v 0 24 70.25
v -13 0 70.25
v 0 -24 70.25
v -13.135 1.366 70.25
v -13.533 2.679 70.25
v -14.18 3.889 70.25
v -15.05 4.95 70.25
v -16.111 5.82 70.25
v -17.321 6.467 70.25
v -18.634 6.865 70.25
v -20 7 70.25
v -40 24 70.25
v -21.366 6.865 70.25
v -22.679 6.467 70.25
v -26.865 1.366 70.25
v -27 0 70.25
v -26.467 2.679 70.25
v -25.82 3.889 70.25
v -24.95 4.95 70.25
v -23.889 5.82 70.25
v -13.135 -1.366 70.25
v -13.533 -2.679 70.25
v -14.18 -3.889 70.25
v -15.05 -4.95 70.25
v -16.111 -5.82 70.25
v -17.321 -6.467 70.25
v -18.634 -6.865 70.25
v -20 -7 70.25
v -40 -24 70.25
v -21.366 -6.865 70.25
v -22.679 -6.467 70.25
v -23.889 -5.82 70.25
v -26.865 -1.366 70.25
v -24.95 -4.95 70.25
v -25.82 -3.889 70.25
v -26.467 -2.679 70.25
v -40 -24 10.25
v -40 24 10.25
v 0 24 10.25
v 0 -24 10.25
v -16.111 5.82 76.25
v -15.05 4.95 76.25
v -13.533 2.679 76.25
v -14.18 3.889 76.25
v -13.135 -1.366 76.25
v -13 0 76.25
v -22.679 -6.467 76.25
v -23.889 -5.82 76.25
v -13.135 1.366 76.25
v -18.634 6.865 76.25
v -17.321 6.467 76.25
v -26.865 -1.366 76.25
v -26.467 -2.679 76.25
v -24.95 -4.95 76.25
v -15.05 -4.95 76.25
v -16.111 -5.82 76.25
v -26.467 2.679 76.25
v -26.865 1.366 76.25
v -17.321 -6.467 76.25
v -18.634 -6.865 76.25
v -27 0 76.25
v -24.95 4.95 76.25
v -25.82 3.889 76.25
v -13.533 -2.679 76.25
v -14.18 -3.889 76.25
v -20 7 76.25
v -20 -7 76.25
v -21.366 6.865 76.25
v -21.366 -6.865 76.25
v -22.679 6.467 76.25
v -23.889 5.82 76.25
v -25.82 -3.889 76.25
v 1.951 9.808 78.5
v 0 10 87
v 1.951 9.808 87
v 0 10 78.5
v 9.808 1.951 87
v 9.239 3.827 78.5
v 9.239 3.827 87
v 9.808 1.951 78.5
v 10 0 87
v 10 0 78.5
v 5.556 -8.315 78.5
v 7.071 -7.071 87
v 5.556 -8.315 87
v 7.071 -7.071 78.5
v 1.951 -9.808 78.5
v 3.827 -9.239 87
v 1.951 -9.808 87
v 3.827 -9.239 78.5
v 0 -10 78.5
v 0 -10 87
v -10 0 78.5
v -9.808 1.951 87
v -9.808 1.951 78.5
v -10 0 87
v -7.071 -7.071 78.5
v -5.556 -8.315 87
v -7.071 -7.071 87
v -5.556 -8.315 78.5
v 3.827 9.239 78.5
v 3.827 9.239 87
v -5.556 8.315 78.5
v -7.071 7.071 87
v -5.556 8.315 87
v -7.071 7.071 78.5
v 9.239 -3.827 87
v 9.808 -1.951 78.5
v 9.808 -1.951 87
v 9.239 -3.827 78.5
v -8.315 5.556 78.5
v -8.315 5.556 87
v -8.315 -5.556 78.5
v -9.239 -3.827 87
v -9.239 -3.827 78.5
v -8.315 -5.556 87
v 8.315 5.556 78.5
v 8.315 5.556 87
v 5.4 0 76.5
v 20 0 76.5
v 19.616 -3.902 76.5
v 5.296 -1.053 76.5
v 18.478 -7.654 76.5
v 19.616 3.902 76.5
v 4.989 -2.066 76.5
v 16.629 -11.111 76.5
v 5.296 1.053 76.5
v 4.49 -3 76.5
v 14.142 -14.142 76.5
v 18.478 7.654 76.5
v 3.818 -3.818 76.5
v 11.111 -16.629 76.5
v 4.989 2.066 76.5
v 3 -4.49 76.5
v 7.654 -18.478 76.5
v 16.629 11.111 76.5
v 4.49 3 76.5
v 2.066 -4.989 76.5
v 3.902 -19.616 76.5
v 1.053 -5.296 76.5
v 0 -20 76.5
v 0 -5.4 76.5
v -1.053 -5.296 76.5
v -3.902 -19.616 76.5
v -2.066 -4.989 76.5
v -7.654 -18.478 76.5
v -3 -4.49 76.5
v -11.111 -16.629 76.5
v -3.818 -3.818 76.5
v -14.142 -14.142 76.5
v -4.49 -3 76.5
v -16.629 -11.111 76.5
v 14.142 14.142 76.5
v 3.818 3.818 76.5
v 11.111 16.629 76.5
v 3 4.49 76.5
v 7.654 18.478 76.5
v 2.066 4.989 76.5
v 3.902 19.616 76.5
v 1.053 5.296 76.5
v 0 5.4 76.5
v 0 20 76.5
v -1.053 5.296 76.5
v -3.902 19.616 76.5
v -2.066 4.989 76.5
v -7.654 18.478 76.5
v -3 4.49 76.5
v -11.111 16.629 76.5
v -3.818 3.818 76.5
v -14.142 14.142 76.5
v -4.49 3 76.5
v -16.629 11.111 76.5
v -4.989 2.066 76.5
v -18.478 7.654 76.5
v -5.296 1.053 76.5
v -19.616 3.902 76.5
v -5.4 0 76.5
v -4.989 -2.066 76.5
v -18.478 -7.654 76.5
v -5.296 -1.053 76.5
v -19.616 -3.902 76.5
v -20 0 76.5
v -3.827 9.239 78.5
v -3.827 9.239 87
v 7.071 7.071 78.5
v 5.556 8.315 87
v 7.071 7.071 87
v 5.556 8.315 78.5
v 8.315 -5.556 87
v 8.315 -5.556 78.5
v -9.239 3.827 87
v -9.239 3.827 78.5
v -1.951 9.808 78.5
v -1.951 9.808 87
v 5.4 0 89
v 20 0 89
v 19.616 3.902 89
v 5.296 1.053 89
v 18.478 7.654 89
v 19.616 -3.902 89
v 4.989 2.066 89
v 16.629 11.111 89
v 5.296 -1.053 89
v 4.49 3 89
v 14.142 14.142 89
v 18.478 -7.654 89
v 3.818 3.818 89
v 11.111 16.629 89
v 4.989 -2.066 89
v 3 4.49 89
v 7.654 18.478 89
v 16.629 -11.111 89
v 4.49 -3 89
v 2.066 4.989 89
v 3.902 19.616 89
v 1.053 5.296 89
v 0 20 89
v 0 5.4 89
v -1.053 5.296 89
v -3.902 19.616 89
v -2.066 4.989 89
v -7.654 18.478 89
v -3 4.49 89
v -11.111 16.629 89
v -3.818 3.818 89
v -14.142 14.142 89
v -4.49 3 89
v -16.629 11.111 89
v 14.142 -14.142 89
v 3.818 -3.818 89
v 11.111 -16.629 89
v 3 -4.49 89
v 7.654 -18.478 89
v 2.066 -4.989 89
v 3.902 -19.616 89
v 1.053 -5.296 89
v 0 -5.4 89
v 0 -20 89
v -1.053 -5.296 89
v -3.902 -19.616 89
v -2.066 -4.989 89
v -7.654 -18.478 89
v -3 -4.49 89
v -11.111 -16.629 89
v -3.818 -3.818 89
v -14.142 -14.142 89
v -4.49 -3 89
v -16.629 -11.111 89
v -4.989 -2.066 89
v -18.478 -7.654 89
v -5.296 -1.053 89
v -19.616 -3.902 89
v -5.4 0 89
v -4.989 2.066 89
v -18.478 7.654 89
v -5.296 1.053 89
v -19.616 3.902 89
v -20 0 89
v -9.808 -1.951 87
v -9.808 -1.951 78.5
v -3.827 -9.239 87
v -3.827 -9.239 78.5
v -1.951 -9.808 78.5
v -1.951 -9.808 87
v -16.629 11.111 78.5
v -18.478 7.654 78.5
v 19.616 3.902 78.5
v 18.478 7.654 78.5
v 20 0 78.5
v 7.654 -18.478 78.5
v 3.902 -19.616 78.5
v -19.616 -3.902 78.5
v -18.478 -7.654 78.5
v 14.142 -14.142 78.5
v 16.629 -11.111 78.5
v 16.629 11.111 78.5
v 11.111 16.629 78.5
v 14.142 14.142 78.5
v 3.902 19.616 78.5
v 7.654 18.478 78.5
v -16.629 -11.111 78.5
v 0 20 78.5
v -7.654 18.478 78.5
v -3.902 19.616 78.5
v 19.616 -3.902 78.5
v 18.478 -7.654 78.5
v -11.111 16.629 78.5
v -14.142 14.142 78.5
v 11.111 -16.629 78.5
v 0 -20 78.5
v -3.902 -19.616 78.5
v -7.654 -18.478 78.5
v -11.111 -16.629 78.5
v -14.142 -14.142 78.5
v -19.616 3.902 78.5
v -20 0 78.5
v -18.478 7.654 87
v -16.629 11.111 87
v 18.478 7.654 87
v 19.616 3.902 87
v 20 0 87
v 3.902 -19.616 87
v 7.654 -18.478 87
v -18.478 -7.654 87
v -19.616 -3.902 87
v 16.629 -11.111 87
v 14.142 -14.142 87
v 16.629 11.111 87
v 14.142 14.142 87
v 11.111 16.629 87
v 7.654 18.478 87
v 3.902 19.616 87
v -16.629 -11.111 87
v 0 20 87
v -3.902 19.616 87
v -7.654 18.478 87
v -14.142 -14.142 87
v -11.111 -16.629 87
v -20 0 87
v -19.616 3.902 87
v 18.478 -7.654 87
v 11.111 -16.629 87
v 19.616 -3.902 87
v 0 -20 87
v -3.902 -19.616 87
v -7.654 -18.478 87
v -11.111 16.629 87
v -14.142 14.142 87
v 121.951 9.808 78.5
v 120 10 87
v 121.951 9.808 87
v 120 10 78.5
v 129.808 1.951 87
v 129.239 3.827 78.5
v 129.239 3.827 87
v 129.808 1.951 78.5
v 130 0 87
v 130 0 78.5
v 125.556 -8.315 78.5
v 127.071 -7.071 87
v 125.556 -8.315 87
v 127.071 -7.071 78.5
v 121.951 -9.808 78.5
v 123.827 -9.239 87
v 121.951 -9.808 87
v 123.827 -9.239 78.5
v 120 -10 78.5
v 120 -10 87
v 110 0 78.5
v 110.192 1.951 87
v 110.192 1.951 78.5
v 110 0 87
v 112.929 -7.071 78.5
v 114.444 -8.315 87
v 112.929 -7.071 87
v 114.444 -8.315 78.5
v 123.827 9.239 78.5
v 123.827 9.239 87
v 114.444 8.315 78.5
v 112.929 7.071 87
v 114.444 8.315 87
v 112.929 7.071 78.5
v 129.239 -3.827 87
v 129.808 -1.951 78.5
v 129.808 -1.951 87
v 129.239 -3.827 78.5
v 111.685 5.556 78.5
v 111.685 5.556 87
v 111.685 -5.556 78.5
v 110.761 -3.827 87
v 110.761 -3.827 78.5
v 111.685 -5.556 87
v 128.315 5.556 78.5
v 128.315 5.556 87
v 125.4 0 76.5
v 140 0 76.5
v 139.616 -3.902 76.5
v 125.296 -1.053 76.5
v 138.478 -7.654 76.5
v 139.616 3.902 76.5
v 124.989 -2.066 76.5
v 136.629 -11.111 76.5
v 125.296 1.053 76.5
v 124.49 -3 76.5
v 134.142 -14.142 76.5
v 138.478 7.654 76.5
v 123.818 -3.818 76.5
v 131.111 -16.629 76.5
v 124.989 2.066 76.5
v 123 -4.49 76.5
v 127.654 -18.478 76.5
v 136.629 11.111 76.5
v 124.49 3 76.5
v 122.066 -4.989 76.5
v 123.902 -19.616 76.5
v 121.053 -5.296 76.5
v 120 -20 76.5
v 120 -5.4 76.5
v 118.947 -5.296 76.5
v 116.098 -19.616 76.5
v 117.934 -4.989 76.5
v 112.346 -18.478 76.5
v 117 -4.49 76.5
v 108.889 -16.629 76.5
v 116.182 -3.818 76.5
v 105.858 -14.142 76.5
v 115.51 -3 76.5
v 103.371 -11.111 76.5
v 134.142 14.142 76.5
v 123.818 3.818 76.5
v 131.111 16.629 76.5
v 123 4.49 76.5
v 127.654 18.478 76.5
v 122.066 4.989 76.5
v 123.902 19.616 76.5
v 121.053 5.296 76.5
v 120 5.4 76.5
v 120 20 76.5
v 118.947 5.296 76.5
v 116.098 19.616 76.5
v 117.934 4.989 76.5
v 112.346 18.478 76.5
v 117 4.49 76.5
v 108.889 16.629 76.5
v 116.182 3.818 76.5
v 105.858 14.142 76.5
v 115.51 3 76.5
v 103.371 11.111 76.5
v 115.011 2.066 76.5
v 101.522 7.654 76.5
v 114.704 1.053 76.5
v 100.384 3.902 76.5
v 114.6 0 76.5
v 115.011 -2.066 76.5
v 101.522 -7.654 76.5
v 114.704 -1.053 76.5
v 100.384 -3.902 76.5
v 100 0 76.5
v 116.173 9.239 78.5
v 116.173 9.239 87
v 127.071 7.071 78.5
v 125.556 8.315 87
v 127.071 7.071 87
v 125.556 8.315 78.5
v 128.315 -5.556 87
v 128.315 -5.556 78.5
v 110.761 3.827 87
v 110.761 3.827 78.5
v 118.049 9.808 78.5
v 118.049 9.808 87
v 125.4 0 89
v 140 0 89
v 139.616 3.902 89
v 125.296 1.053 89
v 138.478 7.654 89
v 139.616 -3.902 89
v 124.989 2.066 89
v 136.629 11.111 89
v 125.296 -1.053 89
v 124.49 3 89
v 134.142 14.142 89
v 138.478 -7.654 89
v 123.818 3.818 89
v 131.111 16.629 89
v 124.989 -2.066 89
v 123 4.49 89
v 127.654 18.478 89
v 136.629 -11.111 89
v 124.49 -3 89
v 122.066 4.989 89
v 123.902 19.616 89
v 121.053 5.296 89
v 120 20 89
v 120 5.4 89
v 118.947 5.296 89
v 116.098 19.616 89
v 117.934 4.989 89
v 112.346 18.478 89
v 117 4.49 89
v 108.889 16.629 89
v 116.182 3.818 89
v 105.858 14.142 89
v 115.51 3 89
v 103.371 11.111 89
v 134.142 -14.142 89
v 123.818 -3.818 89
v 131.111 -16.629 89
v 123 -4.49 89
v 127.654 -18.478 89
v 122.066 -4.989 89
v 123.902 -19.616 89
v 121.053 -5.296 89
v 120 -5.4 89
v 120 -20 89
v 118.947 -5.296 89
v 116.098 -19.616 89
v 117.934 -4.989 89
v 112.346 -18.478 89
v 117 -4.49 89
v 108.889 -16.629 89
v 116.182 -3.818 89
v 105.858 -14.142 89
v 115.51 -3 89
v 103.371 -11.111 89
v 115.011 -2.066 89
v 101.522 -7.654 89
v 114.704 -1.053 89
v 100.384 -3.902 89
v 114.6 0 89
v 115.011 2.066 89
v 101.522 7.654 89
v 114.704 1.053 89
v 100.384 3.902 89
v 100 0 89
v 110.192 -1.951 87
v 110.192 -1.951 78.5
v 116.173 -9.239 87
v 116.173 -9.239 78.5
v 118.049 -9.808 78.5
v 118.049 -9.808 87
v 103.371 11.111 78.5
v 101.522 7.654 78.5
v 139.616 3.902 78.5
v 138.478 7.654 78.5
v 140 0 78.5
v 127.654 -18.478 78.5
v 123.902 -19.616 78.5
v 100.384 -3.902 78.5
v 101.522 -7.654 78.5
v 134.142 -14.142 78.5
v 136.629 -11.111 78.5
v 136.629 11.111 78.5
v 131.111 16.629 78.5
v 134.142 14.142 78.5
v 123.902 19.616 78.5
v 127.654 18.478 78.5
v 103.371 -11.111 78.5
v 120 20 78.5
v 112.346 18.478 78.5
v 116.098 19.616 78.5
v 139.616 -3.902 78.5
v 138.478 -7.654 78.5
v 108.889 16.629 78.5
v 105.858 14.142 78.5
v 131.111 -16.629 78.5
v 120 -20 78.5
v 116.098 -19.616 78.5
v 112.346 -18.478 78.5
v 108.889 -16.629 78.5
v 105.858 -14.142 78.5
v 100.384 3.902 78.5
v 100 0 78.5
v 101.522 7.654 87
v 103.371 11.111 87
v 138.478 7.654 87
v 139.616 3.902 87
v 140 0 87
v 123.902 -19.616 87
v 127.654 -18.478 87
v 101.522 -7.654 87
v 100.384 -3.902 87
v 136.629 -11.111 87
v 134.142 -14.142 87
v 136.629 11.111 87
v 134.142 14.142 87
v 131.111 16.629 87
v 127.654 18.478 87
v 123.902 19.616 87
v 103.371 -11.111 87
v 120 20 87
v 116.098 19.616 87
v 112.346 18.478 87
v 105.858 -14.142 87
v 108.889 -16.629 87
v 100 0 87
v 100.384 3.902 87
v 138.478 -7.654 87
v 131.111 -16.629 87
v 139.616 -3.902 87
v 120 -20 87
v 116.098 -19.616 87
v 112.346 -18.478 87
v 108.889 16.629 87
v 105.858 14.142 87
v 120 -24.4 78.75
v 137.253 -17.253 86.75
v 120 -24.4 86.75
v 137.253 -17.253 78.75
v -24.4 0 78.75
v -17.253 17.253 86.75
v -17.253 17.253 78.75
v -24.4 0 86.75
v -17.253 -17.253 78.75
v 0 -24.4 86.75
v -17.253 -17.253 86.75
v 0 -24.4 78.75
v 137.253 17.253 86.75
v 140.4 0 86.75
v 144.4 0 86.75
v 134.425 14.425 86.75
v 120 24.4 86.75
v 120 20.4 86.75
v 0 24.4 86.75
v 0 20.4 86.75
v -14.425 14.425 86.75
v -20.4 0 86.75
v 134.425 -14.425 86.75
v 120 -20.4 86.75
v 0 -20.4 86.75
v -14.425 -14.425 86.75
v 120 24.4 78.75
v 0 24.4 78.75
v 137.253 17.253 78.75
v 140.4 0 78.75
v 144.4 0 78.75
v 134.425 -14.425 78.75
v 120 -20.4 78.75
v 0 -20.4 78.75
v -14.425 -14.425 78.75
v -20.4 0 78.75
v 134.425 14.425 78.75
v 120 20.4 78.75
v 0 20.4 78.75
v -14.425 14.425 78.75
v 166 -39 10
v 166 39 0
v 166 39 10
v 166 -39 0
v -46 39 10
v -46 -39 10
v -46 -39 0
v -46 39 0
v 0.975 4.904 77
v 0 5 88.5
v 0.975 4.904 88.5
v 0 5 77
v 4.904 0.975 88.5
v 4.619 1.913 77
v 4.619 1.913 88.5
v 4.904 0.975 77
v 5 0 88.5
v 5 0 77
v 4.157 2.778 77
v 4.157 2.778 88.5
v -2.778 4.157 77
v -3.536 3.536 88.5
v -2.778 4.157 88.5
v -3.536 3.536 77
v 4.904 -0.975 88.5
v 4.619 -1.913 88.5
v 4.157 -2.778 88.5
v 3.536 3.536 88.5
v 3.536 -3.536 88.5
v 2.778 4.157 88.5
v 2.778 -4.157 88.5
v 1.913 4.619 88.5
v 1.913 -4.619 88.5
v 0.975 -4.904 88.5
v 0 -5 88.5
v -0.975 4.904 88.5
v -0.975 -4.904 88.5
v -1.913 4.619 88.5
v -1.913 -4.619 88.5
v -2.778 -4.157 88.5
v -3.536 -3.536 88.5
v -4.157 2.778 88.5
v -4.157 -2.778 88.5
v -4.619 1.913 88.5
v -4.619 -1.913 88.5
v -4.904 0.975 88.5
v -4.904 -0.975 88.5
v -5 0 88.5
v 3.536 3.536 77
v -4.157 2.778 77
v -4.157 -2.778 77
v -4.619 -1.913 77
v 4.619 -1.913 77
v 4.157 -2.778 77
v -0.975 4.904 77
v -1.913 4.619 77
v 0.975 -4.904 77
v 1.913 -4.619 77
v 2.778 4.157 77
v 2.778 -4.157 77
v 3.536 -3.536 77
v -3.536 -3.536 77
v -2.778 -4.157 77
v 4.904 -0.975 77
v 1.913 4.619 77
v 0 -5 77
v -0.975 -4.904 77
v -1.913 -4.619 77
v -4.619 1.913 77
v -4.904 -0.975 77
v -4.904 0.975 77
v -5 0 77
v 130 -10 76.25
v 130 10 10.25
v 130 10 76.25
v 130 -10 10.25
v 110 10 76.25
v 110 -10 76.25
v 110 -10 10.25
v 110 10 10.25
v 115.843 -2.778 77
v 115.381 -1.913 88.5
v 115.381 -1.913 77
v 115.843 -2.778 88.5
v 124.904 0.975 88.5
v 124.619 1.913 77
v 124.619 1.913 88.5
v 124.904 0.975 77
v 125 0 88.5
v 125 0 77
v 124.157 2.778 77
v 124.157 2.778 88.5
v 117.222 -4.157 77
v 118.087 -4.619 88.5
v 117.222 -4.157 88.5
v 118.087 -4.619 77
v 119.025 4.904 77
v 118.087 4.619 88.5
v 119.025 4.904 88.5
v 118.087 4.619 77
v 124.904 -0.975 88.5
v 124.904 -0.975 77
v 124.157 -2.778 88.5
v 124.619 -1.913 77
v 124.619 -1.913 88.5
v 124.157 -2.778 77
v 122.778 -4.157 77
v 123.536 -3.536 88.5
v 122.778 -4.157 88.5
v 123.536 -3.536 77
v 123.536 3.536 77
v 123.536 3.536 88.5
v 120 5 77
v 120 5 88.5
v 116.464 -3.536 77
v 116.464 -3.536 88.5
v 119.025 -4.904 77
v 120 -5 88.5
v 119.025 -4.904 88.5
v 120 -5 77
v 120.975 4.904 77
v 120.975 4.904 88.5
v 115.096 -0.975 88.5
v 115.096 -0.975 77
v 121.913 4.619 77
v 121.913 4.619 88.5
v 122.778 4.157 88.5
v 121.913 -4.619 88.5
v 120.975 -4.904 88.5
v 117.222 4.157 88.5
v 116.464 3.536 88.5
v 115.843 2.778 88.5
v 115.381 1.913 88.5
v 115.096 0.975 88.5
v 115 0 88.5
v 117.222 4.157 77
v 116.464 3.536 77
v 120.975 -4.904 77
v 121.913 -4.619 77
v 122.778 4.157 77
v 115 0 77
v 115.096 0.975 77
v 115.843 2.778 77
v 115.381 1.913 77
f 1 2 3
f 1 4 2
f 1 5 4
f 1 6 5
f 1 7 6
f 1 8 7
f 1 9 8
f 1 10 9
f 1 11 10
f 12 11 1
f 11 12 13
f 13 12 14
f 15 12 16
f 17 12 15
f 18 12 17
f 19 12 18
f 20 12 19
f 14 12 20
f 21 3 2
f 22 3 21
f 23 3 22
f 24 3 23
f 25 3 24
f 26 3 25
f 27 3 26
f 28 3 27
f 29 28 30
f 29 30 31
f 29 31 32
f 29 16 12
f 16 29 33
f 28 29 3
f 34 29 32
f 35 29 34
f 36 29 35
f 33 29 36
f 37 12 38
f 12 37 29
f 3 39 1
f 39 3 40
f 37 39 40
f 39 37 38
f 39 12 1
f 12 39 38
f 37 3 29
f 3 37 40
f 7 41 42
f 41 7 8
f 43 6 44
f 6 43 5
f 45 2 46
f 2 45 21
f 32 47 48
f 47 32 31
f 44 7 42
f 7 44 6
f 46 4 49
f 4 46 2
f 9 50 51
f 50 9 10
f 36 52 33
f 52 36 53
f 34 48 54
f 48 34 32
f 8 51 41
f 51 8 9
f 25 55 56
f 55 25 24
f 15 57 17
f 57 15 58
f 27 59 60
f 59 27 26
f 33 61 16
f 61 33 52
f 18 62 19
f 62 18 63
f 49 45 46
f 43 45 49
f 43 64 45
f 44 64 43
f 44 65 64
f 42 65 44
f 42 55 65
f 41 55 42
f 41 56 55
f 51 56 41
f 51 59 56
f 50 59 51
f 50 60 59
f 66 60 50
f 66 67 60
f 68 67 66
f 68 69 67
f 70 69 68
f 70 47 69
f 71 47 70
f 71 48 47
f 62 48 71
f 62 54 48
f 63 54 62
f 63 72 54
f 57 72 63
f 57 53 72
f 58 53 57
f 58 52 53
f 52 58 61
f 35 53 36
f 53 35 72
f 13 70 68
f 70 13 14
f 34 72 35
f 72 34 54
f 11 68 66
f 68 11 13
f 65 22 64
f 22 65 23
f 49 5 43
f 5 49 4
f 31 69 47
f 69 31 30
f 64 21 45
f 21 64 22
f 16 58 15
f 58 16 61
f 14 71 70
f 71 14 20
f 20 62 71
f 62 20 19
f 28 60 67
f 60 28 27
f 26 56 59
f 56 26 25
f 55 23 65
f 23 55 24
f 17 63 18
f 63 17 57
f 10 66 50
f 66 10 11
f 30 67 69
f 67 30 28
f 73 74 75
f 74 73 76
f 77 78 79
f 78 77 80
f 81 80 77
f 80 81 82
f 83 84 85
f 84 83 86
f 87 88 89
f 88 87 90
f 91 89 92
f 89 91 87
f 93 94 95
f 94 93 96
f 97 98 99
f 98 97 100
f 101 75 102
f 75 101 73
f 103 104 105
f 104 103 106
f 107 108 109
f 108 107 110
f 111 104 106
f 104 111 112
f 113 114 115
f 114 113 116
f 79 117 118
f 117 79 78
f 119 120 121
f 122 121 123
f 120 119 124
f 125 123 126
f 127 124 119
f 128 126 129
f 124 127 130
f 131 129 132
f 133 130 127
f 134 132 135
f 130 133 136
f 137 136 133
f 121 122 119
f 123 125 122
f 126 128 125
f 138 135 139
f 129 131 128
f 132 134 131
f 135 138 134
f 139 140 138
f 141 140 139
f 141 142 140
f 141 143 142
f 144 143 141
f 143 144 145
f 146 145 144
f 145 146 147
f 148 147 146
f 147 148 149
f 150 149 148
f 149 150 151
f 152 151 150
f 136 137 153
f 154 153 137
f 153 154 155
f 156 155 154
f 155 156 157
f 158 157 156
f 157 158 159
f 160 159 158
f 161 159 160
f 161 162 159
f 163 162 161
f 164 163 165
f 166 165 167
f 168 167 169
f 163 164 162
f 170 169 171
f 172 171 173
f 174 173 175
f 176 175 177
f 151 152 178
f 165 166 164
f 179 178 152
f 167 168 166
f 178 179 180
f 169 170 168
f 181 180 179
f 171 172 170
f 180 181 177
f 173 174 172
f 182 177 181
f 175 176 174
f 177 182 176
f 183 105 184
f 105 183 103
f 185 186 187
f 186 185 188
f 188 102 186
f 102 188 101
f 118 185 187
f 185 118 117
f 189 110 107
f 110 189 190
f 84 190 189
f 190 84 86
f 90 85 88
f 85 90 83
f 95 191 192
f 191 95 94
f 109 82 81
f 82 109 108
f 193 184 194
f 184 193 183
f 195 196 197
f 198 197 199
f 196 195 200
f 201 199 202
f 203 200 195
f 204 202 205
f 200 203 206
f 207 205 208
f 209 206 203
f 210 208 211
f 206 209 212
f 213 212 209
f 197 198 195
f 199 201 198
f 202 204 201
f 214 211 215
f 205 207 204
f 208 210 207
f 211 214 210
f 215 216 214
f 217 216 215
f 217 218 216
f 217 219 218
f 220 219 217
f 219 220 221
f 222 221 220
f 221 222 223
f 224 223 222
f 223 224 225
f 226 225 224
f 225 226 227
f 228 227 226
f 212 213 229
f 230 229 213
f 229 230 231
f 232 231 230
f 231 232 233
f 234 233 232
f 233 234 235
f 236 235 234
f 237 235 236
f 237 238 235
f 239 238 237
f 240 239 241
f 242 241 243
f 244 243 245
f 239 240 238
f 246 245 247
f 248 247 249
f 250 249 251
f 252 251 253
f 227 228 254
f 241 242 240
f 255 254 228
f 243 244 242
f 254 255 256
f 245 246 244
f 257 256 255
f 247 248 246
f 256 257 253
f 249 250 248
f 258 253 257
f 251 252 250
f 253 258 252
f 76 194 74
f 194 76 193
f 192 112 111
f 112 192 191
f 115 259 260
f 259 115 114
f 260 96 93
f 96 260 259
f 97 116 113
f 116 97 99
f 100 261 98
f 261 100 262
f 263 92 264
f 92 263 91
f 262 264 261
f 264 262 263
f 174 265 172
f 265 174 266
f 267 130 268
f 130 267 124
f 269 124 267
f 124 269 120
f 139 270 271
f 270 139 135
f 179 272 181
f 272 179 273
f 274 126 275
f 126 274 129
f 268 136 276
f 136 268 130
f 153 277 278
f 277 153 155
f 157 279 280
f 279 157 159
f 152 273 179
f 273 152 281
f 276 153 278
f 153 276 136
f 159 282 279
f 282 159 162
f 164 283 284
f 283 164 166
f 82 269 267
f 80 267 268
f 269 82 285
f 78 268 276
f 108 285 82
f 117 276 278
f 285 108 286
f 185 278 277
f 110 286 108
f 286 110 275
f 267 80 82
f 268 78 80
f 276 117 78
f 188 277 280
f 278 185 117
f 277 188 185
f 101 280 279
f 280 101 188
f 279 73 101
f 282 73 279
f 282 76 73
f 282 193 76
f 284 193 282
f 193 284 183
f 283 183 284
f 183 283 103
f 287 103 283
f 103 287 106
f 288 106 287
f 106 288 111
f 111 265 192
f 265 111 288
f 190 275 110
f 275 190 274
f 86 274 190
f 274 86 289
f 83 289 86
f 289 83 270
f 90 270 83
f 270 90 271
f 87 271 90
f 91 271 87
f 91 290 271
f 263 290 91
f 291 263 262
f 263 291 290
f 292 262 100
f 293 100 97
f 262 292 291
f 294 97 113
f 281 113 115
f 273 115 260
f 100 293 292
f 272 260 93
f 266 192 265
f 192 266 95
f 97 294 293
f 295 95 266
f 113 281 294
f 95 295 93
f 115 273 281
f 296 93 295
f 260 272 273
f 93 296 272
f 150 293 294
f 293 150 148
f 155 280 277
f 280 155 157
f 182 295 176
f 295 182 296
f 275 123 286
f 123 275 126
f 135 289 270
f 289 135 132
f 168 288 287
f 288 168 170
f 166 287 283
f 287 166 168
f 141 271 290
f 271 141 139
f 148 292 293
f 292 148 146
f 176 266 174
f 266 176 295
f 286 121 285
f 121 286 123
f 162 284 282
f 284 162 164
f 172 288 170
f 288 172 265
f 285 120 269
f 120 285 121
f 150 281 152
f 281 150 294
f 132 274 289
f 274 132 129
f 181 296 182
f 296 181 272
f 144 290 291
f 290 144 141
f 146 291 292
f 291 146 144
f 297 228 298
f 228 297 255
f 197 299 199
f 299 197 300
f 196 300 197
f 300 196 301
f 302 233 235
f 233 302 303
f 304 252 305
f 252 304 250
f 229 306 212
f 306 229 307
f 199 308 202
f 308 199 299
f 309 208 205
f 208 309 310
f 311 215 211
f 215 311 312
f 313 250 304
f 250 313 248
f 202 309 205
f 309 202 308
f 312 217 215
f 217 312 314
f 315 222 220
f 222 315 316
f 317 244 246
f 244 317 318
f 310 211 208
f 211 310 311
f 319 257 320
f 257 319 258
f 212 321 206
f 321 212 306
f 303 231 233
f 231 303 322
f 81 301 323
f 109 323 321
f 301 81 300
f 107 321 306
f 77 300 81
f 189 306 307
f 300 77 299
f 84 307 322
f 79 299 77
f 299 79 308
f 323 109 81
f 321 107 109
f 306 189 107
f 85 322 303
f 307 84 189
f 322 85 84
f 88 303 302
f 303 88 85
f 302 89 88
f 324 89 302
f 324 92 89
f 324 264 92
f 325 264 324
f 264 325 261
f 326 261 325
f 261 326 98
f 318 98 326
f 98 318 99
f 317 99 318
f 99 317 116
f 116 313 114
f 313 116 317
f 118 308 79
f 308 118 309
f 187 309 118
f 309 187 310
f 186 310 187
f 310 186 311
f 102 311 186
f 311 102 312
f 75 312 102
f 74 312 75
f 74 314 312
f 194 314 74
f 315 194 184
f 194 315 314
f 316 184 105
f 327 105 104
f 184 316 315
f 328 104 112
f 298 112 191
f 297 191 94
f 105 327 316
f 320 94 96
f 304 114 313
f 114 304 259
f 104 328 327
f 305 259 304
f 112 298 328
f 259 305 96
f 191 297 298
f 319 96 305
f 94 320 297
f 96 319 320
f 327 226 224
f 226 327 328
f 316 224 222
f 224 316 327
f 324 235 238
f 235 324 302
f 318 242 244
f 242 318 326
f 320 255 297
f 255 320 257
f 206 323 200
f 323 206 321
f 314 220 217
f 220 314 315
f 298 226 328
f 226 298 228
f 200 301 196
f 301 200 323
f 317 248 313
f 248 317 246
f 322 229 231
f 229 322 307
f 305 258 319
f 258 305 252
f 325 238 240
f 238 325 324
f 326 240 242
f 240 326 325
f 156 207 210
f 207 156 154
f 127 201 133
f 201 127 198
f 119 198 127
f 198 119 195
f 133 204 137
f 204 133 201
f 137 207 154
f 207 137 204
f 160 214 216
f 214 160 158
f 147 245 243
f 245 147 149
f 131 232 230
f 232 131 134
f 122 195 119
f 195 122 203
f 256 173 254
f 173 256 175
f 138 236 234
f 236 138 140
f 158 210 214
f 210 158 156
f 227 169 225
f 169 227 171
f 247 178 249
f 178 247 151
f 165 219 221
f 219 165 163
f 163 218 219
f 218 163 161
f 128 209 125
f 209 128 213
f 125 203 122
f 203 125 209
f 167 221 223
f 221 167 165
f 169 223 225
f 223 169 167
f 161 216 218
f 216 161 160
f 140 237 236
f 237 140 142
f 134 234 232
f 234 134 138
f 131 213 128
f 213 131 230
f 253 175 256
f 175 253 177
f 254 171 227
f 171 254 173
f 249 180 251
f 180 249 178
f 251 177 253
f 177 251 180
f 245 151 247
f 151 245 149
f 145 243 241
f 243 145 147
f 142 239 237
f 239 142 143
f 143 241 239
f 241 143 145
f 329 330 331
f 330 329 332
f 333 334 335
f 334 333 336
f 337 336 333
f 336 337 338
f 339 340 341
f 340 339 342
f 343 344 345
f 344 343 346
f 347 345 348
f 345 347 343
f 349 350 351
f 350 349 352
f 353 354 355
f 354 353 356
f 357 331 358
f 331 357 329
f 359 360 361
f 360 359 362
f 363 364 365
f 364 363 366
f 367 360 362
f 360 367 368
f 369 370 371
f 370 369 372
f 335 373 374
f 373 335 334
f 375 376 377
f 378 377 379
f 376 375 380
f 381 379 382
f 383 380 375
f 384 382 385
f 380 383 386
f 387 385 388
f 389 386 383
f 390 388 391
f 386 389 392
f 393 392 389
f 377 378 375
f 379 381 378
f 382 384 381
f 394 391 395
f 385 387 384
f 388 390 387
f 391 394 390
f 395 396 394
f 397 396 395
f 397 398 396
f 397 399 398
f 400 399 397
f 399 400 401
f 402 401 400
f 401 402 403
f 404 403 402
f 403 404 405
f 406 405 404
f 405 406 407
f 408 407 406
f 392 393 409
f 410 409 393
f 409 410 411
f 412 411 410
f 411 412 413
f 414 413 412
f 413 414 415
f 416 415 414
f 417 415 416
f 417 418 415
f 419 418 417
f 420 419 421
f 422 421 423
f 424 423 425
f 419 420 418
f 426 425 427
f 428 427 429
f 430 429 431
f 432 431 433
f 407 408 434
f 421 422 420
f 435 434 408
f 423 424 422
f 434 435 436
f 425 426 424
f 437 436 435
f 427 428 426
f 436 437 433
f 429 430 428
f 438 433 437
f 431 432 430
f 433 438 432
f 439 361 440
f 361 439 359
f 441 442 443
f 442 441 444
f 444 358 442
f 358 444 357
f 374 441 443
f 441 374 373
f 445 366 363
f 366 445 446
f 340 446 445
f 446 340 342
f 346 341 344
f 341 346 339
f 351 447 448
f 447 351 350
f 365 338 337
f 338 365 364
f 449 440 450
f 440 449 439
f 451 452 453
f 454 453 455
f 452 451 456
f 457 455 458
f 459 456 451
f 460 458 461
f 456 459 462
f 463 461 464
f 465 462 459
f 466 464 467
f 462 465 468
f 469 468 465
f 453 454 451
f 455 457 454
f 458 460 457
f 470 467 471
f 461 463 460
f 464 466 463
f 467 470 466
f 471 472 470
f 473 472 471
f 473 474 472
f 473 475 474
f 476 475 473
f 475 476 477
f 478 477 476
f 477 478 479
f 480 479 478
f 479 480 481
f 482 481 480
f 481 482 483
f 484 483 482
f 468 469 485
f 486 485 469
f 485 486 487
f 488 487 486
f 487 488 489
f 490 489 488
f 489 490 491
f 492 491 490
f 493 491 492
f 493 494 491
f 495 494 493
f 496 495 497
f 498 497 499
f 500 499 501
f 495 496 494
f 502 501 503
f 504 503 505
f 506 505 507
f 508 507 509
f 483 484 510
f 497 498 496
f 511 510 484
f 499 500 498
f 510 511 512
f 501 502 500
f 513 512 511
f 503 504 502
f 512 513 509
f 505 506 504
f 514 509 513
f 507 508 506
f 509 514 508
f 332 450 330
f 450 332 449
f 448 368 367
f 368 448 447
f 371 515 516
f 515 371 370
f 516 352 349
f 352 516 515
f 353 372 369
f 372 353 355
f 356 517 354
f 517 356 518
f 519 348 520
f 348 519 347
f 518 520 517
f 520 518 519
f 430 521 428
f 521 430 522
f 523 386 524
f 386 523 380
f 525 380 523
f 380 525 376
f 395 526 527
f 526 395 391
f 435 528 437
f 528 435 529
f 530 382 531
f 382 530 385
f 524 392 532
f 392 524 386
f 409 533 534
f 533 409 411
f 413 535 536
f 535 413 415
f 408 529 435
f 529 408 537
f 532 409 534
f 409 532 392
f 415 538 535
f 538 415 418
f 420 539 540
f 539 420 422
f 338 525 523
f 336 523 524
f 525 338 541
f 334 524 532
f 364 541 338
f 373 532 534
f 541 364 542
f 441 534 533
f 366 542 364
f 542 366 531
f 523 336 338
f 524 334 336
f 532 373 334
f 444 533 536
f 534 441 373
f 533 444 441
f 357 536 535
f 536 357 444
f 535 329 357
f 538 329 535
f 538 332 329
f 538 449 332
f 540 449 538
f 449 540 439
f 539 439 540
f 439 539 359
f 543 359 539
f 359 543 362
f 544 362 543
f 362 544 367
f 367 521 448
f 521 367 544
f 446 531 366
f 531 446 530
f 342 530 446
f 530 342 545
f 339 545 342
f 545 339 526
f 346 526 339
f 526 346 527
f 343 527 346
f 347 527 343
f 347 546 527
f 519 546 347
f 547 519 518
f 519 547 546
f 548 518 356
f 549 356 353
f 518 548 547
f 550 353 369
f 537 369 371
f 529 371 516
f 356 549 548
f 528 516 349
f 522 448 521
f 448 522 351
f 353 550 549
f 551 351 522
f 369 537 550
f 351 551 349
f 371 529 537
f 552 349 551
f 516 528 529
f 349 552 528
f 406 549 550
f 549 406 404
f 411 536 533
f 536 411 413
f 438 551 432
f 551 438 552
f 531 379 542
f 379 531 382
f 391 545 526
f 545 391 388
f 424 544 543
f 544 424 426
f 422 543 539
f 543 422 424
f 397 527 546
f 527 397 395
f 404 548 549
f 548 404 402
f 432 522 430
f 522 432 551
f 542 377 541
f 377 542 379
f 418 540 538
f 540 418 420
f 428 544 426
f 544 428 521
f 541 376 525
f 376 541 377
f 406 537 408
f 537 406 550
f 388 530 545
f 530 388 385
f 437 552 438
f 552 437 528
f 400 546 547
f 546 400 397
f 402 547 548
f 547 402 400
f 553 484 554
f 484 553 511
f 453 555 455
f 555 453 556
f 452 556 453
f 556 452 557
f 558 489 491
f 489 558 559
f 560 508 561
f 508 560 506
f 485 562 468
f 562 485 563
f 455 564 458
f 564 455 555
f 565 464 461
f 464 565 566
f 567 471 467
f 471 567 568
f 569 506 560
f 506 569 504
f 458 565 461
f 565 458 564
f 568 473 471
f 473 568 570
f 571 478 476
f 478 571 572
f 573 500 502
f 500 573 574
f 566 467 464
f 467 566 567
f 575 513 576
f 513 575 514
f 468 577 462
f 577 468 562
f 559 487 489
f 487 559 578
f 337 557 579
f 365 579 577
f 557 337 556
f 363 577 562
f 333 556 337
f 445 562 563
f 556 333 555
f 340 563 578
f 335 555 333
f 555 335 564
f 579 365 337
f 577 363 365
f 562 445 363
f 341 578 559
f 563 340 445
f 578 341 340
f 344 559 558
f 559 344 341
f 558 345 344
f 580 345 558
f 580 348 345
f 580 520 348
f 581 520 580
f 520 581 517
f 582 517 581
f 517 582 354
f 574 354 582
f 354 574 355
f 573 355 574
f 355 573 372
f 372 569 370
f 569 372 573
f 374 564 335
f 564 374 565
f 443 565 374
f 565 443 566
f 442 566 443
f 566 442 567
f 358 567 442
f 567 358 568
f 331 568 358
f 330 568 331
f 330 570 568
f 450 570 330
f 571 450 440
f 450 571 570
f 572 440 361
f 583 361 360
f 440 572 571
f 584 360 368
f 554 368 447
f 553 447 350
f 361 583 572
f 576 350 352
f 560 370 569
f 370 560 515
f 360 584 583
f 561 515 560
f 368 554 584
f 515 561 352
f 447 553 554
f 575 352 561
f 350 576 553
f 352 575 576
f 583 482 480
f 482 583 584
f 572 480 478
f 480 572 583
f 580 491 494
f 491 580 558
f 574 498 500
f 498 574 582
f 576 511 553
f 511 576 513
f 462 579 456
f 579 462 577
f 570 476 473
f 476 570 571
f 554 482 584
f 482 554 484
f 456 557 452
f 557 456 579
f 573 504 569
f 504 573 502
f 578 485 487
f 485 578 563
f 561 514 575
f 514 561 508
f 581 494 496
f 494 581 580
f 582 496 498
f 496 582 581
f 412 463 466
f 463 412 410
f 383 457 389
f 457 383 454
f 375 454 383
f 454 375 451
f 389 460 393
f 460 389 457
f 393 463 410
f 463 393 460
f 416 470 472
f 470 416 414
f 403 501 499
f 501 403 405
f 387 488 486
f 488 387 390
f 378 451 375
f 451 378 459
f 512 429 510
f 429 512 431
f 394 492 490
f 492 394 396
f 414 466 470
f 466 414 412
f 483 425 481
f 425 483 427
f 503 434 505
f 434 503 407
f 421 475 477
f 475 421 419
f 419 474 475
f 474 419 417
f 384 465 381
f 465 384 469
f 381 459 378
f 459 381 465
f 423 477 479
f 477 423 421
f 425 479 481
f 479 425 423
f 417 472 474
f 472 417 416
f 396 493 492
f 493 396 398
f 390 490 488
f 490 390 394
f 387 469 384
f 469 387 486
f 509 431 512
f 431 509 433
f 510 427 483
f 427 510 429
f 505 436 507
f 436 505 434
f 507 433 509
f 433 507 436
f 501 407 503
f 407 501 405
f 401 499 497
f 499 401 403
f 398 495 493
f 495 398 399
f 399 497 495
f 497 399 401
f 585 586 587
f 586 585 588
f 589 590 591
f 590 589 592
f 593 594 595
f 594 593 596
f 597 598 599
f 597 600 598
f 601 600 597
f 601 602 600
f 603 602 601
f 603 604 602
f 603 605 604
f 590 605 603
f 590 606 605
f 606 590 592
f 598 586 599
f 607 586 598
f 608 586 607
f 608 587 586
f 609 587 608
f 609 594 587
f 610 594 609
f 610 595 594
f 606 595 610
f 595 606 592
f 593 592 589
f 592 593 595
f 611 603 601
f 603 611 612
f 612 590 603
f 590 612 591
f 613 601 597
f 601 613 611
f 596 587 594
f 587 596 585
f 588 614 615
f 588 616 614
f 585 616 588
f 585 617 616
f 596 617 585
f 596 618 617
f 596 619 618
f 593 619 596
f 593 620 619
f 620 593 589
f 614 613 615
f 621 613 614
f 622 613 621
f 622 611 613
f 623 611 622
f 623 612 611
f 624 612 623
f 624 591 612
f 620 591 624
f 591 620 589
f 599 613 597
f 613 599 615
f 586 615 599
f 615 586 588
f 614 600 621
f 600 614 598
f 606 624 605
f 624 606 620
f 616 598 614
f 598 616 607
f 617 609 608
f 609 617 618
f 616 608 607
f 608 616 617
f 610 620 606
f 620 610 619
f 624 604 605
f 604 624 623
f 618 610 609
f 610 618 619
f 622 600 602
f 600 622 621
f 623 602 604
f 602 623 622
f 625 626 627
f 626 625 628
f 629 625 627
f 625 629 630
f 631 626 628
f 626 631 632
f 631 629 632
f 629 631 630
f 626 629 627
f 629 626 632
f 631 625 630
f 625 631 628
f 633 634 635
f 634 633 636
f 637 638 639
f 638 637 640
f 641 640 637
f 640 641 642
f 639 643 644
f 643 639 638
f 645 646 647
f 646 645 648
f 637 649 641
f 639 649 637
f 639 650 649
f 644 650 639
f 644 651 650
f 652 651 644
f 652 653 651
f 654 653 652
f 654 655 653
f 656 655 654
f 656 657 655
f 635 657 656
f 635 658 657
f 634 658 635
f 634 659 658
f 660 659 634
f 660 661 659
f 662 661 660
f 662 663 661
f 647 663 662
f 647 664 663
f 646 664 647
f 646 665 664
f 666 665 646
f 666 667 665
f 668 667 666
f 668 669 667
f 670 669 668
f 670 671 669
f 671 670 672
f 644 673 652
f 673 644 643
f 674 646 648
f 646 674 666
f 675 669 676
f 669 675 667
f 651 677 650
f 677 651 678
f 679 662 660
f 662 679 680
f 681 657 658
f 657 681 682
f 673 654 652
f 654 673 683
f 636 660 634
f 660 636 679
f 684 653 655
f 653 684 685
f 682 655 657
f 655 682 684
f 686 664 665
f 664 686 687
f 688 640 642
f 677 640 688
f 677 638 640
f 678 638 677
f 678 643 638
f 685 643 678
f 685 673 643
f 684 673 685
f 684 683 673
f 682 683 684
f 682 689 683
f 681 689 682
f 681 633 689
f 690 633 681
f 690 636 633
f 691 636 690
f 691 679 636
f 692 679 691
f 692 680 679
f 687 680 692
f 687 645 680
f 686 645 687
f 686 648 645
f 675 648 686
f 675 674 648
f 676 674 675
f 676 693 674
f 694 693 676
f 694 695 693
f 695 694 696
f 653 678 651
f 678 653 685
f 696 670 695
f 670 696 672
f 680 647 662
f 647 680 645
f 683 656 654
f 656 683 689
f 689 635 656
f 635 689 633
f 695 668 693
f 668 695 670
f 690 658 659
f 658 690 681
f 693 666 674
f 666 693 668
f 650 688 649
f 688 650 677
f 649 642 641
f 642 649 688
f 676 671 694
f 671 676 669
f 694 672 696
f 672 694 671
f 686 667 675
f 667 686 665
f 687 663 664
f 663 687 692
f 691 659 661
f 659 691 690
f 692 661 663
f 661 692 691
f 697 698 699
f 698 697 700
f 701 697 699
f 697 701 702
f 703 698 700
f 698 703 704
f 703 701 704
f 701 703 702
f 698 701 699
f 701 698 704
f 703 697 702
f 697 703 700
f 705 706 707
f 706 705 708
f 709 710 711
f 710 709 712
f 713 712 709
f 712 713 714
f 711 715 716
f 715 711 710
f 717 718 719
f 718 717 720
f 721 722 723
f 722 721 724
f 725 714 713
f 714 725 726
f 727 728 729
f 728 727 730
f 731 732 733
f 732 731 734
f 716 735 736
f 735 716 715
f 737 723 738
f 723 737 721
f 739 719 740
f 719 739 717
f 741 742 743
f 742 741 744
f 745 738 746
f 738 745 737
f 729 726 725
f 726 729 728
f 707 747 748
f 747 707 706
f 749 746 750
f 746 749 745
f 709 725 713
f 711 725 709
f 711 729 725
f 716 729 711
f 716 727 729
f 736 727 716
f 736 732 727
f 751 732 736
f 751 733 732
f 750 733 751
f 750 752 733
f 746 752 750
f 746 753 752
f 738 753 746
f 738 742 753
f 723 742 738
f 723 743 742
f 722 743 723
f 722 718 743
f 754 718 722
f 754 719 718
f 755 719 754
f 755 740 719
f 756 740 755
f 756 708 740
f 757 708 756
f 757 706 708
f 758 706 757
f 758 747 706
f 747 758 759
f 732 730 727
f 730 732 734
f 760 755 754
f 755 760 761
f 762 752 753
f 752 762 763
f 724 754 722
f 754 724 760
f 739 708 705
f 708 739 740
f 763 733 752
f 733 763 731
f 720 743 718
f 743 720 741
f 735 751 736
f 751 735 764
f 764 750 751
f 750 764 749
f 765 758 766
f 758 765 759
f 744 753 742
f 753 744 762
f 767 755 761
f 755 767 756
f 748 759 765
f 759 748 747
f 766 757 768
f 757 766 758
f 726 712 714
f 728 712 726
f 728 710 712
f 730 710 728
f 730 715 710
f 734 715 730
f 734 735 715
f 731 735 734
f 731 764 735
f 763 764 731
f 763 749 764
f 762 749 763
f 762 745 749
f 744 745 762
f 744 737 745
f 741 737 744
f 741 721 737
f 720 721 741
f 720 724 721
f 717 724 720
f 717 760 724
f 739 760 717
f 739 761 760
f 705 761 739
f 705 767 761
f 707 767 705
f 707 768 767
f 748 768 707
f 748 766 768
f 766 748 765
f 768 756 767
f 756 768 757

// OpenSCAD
$fn = 32;

// ------------------------------------------------------------------------
// Motor belt drive: span 120 mm, pulleys d40, belt 8 mm wide
// Every part is its own module, assembly() places every instance.
// ------------------------------------------------------------------------

// --- part 1 ---
module base_plate() {
  difference() {
    translate([-106, -39, 0]) cube([212, 78, 10]);
  }
}

// --- part 2 ---
module motor() {
  union() {
    translate([-30, -24, 0]) cube([60, 48, 40]);
    translate([33, 0, 20]) rotate([0, 90, 0]) cylinder(h = 6, d = 14, center = true);
  }
}

// --- part 3 ---
module drive_shaft() {
  translate([0, 0, -5.75]) cylinder(h = 11.5, d = 10);
}

// --- part 4 ---
module pulley_drive() {
  difference() {
    union() {
      cylinder(h = 12.5, d = 20);
      cylinder(h = 2, d = 40);
      translate([0, 0, 10.5]) cylinder(h = 2, d = 40);
    }
    translate([0, 0, -1]) cylinder(h = 14.5, d = 10.8);
  }
}

// --- part 5 ---
module idler_post() {
  translate([-10, -10, 0]) cube([20, 20, 66]);
}

// --- part 6 ---
module driven_shaft() {
  translate([0, 0, -5.75]) cylinder(h = 11.5, d = 10);
}

// --- part 7 ---
module pulley_driven() {
  difference() {
    union() {
      cylinder(h = 12.5, d = 20);
      cylinder(h = 2, d = 40);
      translate([0, 0, 10.5]) cylinder(h = 2, d = 40);
    }
    translate([0, 0, -1]) cylinder(h = 14.5, d = 10.8);
  }
}

// --- part 8 ---
module drive_belt() {
  difference() {
    linear_extrude(height = 8) polygon(points = concat([for (a = [90 : 45 : 270]) [24.4 * cos(a), 24.4 * sin(a)]], [for (a = [270 : 45 : 450]) [120 + 24.4 * cos(a), 24.4 * sin(a)]]));
    translate([0, 0, -1]) linear_extrude(height = 10) polygon(points = concat([for (a = [90 : 45 : 270]) [20.4 * cos(a), 20.4 * sin(a)]], [for (a = [270 : 45 : 450]) [120 + 20.4 * cos(a), 20.4 * sin(a)]]));
  }
}

// --- assembly ---
module assembly() {
  color([0.80, 0.24, 0.20]) translate([60, 0, 0]) rotate([0, 0, 0]) base_plate();
  color([0.20, 0.45, 0.75]) translate([0, 0, 40.25]) rotate([0, 270, 0]) motor();
  color([0.25, 0.62, 0.32]) translate([0, 0, 82.75]) rotate([0, 0, 0]) drive_shaft();
  color([0.92, 0.70, 0.18]) translate([0, 0, 76.5]) rotate([0, 0, 0]) pulley_drive();
  color([0.58, 0.35, 0.70]) translate([120, 0, 10.25]) rotate([0, 0, 0]) idler_post();
  color([0.16, 0.66, 0.66]) translate([120, 0, 82.75]) rotate([0, 0, 0]) driven_shaft();
  color([0.85, 0.48, 0.18]) translate([120, 0, 76.5]) rotate([0, 0, 0]) pulley_driven();
  color([0.55, 0.60, 0.65]) translate([0, 0, 78.75]) rotate([0, 0, 0]) drive_belt();
}

assembly();
